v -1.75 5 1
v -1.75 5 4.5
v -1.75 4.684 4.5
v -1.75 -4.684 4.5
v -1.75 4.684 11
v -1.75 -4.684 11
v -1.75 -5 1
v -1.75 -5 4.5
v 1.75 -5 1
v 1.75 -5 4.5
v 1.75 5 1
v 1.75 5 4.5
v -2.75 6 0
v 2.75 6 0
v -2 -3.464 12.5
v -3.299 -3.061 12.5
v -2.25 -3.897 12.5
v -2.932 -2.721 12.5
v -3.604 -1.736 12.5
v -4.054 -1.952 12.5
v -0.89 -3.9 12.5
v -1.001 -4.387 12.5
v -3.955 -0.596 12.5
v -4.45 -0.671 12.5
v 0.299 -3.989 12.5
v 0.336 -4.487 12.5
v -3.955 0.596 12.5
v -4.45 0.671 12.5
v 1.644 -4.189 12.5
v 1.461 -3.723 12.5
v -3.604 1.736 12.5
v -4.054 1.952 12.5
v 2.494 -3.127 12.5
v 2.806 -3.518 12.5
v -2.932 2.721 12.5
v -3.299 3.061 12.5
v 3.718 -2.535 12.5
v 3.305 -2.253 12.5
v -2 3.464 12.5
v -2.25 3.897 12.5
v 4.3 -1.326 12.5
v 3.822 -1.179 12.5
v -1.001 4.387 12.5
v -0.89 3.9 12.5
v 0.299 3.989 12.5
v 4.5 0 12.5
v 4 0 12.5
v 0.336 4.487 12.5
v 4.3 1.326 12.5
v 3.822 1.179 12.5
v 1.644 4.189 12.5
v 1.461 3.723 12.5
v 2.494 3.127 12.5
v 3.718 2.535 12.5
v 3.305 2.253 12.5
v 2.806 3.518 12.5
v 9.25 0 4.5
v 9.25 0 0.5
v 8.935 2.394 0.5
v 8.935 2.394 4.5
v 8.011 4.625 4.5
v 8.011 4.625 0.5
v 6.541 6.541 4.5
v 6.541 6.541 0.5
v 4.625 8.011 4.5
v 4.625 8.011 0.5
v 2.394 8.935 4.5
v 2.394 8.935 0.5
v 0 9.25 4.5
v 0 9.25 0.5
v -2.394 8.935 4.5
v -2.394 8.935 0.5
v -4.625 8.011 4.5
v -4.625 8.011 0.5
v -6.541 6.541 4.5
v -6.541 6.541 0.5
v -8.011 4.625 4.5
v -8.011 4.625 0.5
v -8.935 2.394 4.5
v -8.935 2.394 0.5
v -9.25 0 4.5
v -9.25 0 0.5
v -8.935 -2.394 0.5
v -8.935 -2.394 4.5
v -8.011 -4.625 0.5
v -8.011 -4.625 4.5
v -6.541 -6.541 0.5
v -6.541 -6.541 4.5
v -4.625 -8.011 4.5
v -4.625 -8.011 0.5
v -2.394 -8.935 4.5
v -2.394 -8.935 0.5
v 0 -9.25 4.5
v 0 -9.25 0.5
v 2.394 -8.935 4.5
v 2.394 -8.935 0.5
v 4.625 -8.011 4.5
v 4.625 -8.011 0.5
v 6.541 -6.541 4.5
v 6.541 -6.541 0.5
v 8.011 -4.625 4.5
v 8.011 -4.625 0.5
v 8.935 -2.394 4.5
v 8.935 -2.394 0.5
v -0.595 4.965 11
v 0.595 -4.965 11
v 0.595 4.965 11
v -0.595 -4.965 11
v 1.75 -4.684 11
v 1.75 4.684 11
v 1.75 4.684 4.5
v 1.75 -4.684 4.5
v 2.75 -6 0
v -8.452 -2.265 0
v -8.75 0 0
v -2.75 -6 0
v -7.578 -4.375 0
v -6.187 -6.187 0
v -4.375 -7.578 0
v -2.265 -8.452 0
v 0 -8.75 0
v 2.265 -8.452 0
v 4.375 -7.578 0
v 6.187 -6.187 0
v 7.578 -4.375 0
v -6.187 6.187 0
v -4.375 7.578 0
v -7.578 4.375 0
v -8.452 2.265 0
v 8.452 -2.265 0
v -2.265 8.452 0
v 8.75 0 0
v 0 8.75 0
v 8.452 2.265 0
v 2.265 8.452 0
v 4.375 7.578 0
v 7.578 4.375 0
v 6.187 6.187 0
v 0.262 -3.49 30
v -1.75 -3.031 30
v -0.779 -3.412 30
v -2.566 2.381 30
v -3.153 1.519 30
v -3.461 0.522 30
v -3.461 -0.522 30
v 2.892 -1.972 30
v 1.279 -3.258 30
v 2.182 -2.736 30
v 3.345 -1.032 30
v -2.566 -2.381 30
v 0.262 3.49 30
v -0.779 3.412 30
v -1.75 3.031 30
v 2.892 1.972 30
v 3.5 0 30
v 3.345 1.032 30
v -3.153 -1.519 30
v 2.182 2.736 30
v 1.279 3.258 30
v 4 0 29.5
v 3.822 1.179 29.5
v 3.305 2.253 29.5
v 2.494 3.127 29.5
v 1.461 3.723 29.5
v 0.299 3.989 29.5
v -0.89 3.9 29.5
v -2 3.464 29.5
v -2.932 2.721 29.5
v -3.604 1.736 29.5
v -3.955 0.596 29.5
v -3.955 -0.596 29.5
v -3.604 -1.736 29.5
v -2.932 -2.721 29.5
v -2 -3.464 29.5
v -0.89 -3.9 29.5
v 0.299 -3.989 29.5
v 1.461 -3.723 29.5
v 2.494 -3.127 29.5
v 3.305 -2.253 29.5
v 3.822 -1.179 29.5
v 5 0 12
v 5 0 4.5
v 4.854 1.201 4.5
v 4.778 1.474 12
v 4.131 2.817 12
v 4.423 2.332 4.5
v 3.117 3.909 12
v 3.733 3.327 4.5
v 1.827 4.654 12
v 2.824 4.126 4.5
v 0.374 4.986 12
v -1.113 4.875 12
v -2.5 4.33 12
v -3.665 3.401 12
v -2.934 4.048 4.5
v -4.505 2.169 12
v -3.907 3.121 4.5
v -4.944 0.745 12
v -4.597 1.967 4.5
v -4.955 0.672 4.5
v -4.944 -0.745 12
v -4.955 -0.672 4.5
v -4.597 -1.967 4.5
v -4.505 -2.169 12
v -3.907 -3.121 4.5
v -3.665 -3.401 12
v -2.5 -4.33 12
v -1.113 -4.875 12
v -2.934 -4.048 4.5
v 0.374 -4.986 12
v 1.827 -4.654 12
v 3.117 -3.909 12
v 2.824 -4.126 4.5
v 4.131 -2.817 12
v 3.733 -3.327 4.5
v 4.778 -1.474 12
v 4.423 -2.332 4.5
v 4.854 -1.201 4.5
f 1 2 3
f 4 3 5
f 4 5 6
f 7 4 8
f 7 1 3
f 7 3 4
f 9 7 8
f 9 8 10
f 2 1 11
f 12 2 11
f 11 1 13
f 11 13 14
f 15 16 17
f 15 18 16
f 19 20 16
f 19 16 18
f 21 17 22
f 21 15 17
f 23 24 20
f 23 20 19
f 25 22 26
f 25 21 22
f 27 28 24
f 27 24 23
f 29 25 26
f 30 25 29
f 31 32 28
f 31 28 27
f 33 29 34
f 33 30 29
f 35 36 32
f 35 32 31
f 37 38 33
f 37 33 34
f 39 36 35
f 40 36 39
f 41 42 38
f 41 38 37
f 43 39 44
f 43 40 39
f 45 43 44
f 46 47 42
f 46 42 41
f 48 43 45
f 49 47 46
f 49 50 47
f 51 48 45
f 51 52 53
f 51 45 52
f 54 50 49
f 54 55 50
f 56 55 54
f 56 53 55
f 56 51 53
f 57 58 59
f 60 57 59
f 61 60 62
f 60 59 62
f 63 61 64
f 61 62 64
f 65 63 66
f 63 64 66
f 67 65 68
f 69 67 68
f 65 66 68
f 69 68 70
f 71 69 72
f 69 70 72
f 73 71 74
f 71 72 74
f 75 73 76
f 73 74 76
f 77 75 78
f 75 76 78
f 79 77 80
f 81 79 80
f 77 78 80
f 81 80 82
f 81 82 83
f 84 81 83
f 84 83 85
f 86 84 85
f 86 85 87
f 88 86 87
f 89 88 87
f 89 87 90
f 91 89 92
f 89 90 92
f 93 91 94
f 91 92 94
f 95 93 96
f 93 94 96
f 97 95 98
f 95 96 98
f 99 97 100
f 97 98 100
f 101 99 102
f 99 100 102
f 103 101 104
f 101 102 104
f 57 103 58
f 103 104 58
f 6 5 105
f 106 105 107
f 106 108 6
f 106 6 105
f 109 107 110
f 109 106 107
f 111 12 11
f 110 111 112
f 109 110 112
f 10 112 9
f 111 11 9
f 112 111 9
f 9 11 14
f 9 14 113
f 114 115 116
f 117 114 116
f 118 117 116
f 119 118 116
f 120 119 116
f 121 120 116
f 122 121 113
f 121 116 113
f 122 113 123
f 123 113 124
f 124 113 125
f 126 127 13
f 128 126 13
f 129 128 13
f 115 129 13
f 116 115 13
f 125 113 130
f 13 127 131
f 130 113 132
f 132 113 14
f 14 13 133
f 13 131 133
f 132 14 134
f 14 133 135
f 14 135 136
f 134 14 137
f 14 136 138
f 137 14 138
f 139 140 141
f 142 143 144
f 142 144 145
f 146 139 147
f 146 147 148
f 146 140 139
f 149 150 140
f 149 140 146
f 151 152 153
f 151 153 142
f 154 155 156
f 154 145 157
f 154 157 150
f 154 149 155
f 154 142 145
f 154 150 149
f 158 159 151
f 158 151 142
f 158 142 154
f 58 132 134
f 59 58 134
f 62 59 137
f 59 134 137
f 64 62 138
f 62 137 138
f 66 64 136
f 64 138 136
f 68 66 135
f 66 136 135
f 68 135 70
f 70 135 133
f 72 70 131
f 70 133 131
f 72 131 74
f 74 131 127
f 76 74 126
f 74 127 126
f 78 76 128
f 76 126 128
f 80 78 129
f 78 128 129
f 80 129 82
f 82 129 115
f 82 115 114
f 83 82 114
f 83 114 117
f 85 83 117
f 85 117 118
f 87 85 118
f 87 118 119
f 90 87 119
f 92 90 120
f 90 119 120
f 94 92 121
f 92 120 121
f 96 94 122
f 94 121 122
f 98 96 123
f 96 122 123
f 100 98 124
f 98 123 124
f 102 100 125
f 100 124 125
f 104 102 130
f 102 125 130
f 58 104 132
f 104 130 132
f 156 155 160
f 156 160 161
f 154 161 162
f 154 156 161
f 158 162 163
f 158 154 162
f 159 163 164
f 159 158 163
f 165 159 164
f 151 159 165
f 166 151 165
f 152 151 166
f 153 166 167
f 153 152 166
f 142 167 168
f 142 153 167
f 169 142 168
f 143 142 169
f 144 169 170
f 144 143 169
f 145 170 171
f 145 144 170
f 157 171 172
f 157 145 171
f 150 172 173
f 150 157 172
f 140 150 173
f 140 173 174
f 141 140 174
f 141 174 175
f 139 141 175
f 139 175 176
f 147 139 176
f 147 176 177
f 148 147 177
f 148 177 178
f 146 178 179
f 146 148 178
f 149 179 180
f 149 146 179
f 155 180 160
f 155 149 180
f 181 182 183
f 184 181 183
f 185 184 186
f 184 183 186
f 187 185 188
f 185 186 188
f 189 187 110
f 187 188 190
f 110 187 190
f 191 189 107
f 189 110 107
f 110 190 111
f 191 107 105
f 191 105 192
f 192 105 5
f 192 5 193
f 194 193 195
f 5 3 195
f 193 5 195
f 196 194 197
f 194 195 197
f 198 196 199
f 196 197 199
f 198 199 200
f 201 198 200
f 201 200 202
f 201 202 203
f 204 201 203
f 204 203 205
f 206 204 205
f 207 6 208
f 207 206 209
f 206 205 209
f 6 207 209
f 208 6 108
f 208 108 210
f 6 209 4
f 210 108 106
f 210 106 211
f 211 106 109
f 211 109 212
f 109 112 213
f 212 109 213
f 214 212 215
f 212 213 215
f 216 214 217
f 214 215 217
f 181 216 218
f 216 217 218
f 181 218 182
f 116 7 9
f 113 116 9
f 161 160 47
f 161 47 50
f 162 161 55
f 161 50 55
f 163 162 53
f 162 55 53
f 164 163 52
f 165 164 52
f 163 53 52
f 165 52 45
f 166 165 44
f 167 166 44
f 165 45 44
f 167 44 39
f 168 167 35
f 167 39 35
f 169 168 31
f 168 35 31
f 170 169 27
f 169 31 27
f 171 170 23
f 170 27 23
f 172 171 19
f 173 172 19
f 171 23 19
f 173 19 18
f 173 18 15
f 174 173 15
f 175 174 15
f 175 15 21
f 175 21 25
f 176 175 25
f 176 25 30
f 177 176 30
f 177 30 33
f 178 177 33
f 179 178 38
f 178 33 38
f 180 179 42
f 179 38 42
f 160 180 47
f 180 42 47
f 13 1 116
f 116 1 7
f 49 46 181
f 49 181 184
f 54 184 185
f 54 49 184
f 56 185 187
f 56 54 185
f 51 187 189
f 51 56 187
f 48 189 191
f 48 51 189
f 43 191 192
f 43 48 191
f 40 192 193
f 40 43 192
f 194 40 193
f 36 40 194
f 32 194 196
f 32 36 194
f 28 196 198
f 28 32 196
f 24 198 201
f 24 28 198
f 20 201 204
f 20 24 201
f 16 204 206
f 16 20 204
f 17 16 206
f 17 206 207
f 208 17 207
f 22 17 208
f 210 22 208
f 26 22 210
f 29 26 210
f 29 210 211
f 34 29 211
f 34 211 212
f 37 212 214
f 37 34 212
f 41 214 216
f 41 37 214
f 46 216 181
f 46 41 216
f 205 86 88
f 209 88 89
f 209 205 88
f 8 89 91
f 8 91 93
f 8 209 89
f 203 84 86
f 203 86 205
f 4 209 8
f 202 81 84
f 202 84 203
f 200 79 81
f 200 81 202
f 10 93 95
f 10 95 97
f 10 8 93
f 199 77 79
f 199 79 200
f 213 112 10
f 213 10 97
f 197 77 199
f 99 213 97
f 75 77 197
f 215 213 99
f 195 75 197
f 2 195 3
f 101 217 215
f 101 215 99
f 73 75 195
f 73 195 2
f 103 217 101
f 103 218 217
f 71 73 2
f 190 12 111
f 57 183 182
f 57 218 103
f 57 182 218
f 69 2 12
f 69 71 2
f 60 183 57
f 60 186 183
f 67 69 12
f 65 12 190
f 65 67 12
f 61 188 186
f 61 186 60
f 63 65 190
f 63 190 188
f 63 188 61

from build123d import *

# Parameters (mm, degrees)
SKETCH_R        = 9.25
PAD_DEPTH       = 4.5
SKETCH001_R     = 5
PAD001_DEPTH    = 8
SKETCH002_R     = 4
PAD002_DEPTH    = 17.5
SKETCH003_W     = 3.5
SKETCH003_H     = 10
POCKET_DEPTH    = 11
CHAMFER_SIZE    = 0.5
CHAMFER001_SIZE = 1


with BuildPart() as part:
    # Sketch → Pad (new body)
    with BuildSketch(Plane.XY):
        Circle(SKETCH_R)
    extrude(amount=PAD_DEPTH)

    # Sketch001 (on Face3 of Pad) → Pad001 (join)
    with BuildSketch(Plane.XY.offset(4.5)):
        Circle(SKETCH001_R)
    extrude(amount=PAD001_DEPTH)

    # Sketch002 (on Face5 of Pad001) → Pad002 (join)
    with BuildSketch(Plane.XY.offset(12.5)):
        Circle(SKETCH002_R)
    extrude(amount=PAD002_DEPTH)

    # Sketch003 (on Face2 of Pad002) → Pocket (cut)
    with BuildSketch(Plane(origin=(0, 0, 0), x_dir=(1, 0, 0), z_dir=(0, 0, -1))):
        Rectangle(SKETCH003_W, SKETCH003_H)
    extrude(amount=-POCKET_DEPTH, mode=Mode.SUBTRACT)

    # Chamfer
    chamfer_edges = [part.edges().sort_by_distance(p)[0] for p in [
        (-4, 0, 30),
        (-5, 0, 12.5),
        (-9.25, 0, 0),
    ]]
    chamfer(chamfer_edges, length=CHAMFER_SIZE)

    # Chamfer001
    chamfer001_edges = [part.edges().sort_by_distance(p)[0] for p in [
        (0, -5, 0),
        (1.75, 0, 0),
        (0, 5, 0),
        (-1.75, 0, 0),
    ]]
    chamfer(chamfer001_edges, length=CHAMFER001_SIZE)


solid = part.part
